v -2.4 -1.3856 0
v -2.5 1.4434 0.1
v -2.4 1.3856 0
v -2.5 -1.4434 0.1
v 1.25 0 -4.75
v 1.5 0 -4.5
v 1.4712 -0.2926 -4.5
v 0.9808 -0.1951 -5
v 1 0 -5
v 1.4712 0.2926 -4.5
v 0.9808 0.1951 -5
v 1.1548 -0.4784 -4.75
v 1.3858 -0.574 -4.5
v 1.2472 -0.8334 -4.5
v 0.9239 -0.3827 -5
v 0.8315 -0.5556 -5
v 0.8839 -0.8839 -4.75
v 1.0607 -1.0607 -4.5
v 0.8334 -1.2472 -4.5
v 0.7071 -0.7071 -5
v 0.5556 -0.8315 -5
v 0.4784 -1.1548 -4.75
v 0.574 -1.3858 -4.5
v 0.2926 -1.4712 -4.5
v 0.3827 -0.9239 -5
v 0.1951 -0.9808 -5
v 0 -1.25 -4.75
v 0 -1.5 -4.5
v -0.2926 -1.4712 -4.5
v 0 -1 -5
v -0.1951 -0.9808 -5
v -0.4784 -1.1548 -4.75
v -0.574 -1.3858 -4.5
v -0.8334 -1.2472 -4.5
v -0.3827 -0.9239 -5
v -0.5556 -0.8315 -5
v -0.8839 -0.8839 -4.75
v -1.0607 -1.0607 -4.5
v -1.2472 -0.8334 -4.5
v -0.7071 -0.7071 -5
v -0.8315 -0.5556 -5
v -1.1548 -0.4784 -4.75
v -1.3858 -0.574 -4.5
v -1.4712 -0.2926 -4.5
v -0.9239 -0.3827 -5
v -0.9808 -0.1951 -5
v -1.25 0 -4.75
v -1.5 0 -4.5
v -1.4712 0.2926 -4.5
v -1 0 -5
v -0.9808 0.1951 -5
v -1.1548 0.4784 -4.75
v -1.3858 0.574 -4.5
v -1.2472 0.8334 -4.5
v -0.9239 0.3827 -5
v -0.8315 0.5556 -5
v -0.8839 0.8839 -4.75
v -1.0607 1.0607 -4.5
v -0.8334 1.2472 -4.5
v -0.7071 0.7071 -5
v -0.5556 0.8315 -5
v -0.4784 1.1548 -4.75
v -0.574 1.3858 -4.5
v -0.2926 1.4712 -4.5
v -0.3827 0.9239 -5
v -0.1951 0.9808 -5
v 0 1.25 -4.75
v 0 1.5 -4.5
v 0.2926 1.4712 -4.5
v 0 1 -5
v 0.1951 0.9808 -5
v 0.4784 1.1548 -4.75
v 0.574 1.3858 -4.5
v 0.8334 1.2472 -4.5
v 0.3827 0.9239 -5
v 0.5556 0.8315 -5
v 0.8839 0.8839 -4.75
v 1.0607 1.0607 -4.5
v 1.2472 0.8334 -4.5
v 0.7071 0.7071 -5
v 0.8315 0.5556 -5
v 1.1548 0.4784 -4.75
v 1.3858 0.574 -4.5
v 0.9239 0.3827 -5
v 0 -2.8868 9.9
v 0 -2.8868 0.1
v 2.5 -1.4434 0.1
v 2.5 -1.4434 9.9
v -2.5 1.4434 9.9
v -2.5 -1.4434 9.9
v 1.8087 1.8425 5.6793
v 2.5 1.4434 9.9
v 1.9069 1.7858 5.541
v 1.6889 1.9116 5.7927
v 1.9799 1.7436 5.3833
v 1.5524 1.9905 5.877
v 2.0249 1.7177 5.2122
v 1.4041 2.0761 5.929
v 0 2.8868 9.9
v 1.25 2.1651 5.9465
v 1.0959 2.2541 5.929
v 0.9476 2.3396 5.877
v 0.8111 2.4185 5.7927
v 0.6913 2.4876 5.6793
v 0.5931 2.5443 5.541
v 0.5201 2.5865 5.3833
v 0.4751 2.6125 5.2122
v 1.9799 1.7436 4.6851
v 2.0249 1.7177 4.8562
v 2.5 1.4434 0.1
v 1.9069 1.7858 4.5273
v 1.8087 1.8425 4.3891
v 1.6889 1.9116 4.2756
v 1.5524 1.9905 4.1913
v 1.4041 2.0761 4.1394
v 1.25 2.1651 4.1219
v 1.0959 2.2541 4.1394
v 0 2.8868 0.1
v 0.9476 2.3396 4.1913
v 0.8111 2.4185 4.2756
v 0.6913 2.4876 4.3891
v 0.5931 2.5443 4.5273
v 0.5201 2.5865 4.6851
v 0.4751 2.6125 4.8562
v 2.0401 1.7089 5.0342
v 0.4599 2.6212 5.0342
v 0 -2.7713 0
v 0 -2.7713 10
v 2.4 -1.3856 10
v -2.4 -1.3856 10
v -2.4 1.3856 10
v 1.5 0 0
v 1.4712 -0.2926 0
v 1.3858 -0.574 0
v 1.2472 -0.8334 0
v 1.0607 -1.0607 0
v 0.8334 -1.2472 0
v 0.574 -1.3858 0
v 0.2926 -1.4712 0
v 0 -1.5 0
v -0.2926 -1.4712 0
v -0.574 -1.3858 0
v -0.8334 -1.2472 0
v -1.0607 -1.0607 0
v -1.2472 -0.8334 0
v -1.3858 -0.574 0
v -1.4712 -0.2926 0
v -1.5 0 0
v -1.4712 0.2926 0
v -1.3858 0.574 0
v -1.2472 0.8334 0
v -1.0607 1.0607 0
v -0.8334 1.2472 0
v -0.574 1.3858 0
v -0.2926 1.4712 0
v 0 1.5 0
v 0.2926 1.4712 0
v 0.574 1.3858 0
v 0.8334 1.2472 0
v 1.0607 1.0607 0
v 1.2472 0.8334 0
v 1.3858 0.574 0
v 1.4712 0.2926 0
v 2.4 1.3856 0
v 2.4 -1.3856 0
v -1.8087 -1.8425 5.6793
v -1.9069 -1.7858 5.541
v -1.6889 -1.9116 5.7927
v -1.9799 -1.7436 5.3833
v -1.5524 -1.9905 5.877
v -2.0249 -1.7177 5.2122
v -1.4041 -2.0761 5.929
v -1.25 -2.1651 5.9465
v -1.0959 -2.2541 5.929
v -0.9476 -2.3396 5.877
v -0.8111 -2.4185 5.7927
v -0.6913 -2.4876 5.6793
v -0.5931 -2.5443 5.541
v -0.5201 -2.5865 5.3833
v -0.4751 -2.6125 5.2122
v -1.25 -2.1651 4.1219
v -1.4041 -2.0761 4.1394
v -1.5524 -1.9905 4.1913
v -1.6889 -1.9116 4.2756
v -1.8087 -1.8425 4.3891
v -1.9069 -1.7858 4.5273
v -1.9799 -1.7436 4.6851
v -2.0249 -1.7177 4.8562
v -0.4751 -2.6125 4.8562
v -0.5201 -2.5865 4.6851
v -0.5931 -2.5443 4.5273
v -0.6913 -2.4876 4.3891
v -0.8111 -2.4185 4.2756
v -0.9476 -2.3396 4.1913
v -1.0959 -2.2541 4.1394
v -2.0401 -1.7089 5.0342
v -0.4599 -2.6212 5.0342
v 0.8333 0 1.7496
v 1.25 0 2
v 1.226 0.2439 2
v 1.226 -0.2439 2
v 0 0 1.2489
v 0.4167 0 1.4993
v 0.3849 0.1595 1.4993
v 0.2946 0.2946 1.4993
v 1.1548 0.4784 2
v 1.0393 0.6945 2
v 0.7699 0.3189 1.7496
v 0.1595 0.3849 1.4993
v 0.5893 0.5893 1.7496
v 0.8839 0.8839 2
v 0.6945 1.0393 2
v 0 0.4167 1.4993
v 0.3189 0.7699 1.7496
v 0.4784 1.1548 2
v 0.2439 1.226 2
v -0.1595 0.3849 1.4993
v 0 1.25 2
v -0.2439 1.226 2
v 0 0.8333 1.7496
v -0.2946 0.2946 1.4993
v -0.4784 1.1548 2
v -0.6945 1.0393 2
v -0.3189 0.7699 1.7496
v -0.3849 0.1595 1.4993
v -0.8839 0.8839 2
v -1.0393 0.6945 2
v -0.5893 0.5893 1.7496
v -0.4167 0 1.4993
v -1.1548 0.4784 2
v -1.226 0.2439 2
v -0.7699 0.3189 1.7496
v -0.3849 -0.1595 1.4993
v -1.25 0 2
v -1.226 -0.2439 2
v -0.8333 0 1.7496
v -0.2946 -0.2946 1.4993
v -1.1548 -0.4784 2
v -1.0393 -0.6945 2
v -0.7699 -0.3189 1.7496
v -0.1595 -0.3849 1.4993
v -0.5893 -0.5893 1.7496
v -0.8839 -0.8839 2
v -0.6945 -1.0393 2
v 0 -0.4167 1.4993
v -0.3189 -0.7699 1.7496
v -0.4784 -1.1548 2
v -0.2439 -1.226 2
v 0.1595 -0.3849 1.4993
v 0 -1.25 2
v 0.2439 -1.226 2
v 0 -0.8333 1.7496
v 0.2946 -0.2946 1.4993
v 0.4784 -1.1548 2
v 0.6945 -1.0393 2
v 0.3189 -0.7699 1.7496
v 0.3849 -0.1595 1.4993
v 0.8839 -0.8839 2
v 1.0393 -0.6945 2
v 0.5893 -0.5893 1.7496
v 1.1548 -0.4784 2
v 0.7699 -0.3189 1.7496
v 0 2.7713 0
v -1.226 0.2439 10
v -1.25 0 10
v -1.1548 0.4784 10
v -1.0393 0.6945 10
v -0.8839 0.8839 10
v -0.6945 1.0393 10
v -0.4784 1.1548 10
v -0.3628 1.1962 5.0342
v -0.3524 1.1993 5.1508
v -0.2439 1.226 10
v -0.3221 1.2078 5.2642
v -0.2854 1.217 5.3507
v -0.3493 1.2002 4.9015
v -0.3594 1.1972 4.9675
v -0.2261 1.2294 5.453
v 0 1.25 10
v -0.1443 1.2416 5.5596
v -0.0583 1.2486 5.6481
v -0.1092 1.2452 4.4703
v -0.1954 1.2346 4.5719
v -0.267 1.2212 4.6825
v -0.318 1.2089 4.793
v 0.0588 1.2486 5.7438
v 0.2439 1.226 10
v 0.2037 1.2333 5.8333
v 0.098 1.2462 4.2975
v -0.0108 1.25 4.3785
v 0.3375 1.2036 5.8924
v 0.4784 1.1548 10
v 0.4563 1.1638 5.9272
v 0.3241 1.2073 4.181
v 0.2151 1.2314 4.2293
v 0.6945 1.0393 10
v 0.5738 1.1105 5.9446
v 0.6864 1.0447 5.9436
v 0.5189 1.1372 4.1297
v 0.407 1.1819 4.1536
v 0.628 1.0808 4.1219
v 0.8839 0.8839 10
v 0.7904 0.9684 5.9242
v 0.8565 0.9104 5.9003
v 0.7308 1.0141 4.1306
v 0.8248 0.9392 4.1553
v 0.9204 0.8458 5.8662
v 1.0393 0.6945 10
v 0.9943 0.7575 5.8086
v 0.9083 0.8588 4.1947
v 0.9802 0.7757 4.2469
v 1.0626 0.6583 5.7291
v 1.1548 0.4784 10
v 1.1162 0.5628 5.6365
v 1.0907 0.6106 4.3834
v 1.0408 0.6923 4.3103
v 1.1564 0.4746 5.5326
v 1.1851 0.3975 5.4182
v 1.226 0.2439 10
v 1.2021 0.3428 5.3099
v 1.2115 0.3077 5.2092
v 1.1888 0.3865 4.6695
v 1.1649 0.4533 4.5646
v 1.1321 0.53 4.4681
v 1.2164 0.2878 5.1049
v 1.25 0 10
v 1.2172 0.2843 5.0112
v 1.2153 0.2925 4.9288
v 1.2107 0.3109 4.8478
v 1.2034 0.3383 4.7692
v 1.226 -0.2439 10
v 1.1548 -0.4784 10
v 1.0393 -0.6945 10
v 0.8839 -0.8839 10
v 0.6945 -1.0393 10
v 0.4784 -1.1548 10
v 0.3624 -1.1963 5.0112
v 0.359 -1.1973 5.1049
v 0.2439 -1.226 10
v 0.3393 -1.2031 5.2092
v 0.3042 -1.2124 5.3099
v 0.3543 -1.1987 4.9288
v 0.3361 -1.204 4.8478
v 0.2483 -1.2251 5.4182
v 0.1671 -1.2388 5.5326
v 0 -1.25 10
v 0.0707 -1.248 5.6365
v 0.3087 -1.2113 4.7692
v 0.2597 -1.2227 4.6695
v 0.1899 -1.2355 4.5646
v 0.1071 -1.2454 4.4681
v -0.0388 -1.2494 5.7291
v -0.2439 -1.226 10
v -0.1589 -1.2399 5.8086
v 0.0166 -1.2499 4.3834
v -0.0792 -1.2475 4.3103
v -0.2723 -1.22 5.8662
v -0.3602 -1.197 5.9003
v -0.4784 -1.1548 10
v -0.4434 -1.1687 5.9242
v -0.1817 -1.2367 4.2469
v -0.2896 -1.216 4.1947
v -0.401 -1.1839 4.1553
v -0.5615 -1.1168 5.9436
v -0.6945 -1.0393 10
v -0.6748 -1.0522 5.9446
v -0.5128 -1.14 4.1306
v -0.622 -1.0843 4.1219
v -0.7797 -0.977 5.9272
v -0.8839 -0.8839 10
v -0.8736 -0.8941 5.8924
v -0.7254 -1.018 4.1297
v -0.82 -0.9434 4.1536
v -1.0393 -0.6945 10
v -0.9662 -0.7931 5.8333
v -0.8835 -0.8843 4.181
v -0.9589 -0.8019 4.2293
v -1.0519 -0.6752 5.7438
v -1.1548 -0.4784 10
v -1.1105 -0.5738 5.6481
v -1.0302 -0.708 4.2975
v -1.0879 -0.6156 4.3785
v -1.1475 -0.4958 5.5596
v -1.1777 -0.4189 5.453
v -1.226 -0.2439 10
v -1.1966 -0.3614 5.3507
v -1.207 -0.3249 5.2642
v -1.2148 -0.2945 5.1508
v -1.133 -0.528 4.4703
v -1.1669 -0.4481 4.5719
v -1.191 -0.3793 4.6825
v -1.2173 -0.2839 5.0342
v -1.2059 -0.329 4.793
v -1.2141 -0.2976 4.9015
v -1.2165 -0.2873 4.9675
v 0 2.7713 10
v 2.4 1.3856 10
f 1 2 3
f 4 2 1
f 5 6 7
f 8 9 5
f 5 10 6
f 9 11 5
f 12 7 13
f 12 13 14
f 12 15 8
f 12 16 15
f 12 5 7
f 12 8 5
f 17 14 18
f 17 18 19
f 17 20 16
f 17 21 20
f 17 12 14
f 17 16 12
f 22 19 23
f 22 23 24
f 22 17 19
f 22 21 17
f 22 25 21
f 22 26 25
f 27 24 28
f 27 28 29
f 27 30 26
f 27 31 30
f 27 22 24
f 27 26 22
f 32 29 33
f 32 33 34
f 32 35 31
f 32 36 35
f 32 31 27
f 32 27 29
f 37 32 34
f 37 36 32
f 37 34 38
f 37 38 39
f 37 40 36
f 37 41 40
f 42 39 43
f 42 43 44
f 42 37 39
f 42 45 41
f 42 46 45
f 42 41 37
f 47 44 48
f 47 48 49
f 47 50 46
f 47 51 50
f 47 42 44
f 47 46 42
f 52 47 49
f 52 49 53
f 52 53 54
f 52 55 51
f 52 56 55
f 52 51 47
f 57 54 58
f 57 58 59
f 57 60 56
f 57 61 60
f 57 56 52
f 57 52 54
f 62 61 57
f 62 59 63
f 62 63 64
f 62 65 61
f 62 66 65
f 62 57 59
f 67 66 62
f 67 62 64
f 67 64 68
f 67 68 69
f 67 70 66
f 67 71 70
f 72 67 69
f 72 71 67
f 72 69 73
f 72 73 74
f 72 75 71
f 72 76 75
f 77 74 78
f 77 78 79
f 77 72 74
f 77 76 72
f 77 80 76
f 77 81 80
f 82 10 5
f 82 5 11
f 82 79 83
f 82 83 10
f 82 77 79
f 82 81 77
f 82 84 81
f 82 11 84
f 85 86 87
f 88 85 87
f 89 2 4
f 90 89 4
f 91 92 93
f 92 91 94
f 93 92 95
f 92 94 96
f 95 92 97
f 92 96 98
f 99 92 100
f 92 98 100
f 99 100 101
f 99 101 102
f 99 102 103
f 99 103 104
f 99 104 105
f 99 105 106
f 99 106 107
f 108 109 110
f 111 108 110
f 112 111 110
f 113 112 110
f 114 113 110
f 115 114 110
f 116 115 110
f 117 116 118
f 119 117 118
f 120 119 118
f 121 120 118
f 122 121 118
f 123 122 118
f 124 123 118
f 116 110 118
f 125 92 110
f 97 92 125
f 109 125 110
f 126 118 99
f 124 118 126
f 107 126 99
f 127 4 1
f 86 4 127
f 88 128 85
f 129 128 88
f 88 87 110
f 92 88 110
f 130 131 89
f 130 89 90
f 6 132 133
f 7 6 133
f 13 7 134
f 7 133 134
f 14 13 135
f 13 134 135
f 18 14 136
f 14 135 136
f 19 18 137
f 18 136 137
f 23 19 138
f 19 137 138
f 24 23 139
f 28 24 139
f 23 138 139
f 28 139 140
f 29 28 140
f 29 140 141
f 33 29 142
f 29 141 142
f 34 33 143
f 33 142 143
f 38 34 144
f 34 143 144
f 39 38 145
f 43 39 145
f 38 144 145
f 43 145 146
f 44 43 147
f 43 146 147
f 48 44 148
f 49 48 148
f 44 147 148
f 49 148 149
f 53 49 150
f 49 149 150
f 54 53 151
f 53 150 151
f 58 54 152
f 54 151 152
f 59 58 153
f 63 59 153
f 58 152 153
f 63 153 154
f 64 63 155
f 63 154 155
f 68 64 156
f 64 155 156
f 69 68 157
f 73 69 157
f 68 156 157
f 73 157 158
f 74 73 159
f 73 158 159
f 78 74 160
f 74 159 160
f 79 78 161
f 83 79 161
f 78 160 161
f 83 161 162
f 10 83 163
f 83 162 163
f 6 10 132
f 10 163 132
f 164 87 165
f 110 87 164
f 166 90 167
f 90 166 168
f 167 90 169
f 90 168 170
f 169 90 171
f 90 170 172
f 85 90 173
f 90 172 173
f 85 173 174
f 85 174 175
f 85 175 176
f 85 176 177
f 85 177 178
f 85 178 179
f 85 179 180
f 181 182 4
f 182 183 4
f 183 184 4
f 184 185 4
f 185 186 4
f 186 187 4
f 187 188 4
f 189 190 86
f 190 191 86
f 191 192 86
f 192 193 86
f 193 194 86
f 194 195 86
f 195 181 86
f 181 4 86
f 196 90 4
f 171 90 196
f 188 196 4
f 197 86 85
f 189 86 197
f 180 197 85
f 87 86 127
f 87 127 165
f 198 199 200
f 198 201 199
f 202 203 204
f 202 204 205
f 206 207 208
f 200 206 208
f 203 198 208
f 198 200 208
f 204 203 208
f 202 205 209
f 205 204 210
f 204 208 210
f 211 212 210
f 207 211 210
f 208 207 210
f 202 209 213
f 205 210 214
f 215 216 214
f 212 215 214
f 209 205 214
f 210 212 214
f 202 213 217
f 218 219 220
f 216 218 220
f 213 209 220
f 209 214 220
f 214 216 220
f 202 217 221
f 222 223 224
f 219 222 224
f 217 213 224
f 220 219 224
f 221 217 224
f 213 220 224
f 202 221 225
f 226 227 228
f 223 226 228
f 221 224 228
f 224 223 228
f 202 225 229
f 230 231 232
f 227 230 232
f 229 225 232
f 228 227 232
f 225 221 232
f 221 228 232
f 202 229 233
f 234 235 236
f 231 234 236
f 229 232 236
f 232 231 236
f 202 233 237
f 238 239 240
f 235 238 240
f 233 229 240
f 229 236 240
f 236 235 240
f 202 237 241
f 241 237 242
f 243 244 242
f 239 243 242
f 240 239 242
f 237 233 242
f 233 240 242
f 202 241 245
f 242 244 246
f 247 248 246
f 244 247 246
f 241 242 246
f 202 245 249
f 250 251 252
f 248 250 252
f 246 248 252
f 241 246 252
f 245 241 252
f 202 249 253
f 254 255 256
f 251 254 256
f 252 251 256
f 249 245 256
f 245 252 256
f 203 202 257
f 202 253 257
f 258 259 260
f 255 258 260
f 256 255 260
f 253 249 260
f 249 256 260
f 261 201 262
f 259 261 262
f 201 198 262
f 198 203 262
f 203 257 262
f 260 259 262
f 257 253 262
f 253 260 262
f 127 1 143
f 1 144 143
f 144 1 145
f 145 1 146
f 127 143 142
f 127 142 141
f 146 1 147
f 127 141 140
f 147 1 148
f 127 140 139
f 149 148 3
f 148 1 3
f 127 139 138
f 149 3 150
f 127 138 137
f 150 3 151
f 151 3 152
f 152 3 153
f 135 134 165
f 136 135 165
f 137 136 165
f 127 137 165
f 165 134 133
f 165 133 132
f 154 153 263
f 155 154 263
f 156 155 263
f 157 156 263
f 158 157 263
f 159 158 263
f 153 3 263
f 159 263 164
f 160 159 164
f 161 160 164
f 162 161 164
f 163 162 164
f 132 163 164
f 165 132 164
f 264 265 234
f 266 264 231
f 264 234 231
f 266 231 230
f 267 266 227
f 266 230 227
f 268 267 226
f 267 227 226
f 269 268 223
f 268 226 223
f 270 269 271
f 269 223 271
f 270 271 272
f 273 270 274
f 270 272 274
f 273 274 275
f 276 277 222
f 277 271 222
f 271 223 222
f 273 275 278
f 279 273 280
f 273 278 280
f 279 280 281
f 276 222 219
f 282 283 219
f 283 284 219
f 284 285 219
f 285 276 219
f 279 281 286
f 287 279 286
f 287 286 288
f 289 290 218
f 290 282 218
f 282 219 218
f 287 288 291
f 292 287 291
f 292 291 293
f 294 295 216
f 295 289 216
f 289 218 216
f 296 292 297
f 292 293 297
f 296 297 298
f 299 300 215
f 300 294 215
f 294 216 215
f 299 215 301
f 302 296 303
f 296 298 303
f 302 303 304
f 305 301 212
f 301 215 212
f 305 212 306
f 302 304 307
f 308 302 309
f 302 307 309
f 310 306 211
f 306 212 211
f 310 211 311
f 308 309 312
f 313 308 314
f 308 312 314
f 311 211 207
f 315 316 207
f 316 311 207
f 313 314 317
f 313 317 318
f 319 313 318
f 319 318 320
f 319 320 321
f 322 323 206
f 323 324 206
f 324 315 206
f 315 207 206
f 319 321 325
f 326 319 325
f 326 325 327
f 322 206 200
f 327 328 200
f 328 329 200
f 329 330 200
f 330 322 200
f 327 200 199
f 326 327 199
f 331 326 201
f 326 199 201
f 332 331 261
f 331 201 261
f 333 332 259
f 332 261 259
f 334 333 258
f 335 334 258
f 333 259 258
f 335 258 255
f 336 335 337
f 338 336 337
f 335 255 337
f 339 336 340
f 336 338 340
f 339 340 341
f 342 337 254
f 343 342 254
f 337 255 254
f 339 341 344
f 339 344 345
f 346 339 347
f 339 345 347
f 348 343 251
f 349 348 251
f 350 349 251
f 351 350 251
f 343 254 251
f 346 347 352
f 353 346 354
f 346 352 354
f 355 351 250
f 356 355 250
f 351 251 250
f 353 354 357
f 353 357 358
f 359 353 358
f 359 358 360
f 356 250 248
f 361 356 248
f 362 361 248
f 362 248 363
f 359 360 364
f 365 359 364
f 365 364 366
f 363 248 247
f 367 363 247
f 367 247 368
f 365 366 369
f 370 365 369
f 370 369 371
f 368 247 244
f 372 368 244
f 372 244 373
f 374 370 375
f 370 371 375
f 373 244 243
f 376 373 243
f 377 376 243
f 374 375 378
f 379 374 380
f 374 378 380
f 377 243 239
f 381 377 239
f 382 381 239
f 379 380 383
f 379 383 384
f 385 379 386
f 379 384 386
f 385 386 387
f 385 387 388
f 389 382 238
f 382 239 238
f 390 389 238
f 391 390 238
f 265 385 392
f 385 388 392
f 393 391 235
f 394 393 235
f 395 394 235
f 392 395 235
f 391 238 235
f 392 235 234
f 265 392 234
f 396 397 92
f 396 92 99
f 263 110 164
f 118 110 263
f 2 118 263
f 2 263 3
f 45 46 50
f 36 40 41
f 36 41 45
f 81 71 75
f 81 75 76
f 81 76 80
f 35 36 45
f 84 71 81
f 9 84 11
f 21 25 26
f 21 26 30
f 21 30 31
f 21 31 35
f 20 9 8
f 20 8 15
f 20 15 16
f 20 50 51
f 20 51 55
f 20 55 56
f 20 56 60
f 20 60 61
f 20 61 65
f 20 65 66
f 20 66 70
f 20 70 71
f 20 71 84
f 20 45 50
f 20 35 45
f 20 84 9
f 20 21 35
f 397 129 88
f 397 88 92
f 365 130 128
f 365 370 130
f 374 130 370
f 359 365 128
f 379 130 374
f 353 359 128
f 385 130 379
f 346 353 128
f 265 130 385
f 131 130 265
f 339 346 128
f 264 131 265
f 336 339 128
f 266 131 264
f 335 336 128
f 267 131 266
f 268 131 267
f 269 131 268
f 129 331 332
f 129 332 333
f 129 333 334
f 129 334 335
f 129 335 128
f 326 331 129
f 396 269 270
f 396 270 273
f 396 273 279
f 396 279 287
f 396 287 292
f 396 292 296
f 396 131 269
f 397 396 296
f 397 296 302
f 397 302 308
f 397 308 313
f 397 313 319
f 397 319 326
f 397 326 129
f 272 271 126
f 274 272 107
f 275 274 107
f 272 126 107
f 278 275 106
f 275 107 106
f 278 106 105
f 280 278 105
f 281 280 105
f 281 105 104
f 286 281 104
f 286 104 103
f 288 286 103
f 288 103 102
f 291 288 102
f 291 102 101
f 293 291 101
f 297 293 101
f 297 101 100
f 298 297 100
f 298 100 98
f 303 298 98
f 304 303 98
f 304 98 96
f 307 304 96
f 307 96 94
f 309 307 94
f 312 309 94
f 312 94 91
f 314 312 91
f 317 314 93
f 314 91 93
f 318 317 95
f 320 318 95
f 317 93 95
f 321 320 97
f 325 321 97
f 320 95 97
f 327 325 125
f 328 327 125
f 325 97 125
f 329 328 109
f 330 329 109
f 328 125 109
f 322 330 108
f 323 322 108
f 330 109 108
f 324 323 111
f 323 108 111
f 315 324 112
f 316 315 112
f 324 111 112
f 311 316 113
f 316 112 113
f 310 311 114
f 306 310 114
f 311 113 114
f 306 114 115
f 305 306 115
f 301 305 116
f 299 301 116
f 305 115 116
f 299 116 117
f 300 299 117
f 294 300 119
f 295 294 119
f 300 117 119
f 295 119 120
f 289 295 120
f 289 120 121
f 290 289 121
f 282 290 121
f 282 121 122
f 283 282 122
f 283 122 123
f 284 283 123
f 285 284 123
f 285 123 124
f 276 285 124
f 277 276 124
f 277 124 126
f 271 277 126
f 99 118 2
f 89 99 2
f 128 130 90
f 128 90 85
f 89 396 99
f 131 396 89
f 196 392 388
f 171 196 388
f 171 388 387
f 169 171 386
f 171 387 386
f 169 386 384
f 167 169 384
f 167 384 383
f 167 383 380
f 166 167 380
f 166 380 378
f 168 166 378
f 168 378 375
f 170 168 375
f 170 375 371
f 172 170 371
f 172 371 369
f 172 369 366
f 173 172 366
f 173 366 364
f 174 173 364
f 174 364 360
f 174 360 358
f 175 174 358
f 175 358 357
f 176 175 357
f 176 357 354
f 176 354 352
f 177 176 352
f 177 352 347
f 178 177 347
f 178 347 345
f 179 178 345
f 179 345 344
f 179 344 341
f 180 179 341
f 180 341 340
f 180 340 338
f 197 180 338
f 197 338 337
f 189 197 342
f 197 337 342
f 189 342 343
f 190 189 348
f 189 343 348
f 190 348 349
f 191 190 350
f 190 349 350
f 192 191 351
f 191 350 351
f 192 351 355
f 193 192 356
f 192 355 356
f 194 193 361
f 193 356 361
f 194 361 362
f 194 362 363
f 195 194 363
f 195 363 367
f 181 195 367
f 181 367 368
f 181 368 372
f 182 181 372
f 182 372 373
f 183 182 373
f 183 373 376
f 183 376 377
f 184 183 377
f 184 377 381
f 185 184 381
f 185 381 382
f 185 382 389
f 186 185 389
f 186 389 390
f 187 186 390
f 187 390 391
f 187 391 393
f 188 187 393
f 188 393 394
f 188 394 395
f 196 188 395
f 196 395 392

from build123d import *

# Parameters (mm, degrees)
DODANIE_WYCI_GNI_CIE1_DEPTH = 10
SZKIC2_R                    = 1.5
DODANIE_WYCI_GNI_CIE2_DEPTH = 5
SFAZOWANIE2_SIZE            = 0.5
OTW_R_GWINTOWANY_M31_D      = 2.5
OTW_R_GWINTOWANY_M31_DEPTH  = 8
OTW_R_GWINTOWANY_M31_TIP    = 0.751075774
SFAZOWANIE3_SIZE            = 0.1
SZKIC29_R                   = 0.91230631
WYTNIJ_WYCI_GNI_CIE1_DEPTH  = 12.814539066


with BuildPart() as part:
    # Szkic1 → Dodanie-wyciągnięcie1 (new body)
    with BuildSketch(Plane.XY):
        Polygon((0, 2.886751346), (-2.5, 1.443375673), (-2.5, -1.443375673), (0, -2.886751346), (2.5, -1.443375673), (2.5, 1.443375673), align=None)
    extrude(amount=DODANIE_WYCI_GNI_CIE1_DEPTH)

    # Szkic2 → Dodanie-wyciągnięcie2 (add)
    with BuildSketch(Plane(origin=(0, 0, 0), x_dir=(-1, 0, 0), z_dir=(0, 0, -1))):
        with Locations(Location((0, 0, 0), (0, 0, 180))):
            Circle(SZKIC2_R)
    extrude(amount=DODANIE_WYCI_GNI_CIE2_DEPTH)

    # Sfazowanie2
    sfazowanie2_edges = [part.edges().sort_by_distance(p)[0] for p in [
        (-1.5, 0, -5),
    ]]
    chamfer(sfazowanie2_edges, length=SFAZOWANIE2_SIZE)

    # Otwór gwintowany M31
    with Locations(Plane.XY.offset(10)):
        with Locations((0, 0)):
            Hole(OTW_R_GWINTOWANY_M31_D / 2, depth=OTW_R_GWINTOWANY_M31_DEPTH)
            with Locations((0, 0, -(OTW_R_GWINTOWANY_M31_DEPTH + OTW_R_GWINTOWANY_M31_TIP / 2))):  # 118° drill point
                Cone(0, OTW_R_GWINTOWANY_M31_D / 2, OTW_R_GWINTOWANY_M31_TIP, mode=Mode.SUBTRACT)

    # Sfazowanie3
    sfazowanie3_edges = [part.edges().sort_by_distance(p)[0] for p in [
        (-2.5, 0, 10),
        (-1.25, -2.165063509, 10),
        (1.25, -2.165063509, 10),
        (2.5, 0, 10),
        (1.25, 2.165063509, 10),
        (2.5, 0, 0),
        (1.25, -2.165063509, 0),
        (-1.25, -2.165063509, 0),
        (-1.25, 2.165063509, 10),
        (-2.5, 0, 0),
        (-1.25, 2.165063509, 0),
        (1.25, 2.165063509, 0),
    ]]
    chamfer(sfazowanie3_edges, length=SFAZOWANIE3_SIZE)

    # Szkic29 → Wytnij-wyciągnięcie1 (cut, through all)
    with BuildSketch(Plane(origin=(1.25, 2.165063509, 0), x_dir=(0.8660254037844415, -0.49999999999999517, 0), z_dir=(0.4999999999999951, 0.8660254037844414, 0))):
        with Locations(Location((0, -5.034184195, 0), (0, 0, 180))):
            Circle(SZKIC29_R)
    extrude(amount=-WYTNIJ_WYCI_GNI_CIE1_DEPTH, mode=Mode.SUBTRACT)


solid = part.part
